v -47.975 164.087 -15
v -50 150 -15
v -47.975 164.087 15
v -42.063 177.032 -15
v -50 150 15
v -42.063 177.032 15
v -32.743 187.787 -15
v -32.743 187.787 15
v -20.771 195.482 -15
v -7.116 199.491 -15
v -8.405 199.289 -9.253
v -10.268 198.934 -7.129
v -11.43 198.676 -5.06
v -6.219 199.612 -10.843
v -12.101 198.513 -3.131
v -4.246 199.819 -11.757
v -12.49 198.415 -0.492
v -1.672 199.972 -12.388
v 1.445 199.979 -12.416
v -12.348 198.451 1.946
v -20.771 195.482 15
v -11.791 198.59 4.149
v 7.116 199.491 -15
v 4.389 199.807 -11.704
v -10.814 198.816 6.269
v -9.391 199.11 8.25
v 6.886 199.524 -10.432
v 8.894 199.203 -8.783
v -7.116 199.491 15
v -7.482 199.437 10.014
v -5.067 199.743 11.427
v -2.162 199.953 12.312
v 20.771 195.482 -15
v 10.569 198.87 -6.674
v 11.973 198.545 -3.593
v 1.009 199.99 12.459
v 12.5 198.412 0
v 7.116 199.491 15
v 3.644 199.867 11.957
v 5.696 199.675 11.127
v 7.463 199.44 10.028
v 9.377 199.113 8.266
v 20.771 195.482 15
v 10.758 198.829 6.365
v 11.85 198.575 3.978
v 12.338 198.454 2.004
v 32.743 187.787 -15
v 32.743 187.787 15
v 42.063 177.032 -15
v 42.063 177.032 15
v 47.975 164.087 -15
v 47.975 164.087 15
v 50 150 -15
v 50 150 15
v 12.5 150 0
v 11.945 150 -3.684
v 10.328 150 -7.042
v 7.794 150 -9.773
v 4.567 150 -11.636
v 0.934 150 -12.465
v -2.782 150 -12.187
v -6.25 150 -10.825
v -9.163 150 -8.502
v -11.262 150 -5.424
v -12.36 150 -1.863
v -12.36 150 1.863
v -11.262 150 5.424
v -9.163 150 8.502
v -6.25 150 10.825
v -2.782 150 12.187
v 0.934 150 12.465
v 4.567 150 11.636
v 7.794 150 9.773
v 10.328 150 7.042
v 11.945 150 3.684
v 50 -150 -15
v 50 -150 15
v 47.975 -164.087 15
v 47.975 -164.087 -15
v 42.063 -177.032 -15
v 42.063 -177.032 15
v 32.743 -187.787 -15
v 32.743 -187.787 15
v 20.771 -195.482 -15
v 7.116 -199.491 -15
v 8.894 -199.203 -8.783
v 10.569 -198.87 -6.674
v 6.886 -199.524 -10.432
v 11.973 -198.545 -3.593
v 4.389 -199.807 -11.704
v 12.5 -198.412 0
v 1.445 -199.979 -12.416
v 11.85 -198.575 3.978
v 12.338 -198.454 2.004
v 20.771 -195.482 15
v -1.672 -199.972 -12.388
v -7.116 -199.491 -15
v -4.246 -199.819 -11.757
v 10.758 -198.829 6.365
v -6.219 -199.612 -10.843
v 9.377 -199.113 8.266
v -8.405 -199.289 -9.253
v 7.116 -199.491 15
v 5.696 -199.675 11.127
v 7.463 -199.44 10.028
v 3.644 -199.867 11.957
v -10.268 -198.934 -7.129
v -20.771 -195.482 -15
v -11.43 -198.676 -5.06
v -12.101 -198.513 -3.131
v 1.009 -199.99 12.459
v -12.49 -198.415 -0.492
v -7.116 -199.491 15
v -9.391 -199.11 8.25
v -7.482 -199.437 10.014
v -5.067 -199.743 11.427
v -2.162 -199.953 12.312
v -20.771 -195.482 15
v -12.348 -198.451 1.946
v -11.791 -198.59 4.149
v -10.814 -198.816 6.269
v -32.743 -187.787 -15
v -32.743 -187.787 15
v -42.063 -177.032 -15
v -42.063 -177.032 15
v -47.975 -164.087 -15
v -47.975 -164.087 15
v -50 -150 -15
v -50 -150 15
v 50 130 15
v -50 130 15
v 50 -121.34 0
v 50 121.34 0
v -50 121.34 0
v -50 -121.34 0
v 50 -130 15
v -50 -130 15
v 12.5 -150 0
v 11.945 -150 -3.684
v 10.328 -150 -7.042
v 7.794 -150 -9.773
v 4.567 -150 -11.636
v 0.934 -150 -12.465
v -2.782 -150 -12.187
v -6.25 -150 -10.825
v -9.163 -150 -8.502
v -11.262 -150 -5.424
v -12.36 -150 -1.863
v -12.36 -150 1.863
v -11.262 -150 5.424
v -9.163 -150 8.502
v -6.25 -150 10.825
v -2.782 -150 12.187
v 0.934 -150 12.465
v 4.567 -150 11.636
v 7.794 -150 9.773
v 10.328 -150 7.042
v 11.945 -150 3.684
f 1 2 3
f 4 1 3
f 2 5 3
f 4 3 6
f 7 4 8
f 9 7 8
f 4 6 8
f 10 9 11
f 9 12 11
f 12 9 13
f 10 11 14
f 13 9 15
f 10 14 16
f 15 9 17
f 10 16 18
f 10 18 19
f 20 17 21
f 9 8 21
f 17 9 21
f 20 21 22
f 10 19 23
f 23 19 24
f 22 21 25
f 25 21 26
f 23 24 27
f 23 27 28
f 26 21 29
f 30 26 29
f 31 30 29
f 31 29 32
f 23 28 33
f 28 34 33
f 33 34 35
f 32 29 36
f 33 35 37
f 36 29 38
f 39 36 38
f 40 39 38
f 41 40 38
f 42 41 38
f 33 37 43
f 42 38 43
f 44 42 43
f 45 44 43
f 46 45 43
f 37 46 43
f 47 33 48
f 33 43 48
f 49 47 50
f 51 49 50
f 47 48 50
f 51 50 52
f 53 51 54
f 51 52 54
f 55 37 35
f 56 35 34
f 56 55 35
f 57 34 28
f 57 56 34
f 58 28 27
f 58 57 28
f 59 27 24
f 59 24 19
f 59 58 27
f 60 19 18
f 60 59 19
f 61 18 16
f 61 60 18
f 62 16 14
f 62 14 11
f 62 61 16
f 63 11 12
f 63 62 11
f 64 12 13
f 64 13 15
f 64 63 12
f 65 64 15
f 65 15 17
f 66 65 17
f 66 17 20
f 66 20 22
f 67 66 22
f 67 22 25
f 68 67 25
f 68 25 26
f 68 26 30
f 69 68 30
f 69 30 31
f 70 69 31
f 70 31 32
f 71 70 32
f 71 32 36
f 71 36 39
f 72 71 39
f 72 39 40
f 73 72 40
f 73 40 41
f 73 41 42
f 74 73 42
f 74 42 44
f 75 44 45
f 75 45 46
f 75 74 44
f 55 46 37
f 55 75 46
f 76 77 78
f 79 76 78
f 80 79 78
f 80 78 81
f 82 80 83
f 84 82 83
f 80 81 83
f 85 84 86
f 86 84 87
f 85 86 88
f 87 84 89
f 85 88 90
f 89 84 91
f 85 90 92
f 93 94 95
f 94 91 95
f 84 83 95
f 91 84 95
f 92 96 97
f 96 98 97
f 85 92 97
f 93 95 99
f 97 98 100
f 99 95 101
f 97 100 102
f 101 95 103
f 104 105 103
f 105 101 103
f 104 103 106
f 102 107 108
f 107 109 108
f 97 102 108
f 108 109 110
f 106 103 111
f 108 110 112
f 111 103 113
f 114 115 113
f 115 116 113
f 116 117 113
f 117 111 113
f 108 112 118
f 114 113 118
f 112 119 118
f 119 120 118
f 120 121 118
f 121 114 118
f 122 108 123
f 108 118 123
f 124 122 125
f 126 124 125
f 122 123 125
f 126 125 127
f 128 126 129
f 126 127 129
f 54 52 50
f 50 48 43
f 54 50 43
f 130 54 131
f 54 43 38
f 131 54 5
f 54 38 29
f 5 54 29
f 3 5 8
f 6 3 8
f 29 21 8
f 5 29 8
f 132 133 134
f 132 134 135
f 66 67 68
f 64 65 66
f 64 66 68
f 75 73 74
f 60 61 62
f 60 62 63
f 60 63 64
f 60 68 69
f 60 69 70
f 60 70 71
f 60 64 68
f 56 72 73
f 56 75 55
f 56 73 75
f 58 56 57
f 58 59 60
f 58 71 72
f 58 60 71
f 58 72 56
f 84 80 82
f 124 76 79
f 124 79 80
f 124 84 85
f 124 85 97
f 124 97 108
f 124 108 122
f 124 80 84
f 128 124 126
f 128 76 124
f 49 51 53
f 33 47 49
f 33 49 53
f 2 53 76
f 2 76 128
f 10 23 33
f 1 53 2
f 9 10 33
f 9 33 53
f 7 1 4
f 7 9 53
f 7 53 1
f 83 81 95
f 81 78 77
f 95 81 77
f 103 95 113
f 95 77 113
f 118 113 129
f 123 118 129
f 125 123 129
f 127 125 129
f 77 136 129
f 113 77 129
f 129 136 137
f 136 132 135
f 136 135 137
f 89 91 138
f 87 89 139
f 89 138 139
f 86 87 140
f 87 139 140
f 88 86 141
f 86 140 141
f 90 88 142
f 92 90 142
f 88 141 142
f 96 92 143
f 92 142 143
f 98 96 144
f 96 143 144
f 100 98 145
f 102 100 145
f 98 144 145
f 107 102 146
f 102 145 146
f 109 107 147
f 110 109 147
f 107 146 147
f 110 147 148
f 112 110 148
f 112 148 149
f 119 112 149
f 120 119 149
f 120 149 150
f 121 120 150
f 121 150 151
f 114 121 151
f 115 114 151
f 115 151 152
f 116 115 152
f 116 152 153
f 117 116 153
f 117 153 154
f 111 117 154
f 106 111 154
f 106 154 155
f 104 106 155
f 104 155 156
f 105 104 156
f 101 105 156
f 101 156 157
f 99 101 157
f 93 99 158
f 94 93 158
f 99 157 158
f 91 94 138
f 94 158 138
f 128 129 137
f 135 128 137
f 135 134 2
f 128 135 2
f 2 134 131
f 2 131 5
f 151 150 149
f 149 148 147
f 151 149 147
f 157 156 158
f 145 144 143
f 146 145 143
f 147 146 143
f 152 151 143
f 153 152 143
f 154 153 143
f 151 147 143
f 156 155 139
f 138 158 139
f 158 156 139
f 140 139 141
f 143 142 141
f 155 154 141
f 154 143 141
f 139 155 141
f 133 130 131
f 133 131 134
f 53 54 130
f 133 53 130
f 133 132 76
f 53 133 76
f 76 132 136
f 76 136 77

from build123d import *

# Parameters (mm, degrees)
BOSS_EXTRUDE1_DEPTH = 15
SKETCH5_R           = 12.5
CUT_EXTRUDE1_DEPTH  = 59
CUT_EXTRUDE3_DEPTH  = 110
SKETCH10_R          = 12.5
CUT_EXTRUDE4_DEPTH  = 94


with BuildPart() as part:
    # Sketch2 → Boss-Extrude1 (new body, symmetric)
    with BuildSketch(Plane.XY):
        with BuildLine():
            Line((-50, -150), (-50, 150))
            ThreePointArc((-50, 150), (0, 200), (50, 150))
            Line((50, 150), (50, -150))
            ThreePointArc((50, -150), (0, -200), (-50, -150))
        make_face()
    extrude(amount=BOSS_EXTRUDE1_DEPTH, both=True)

    # Sketch5 → Cut-Extrude1 (cut)
    with BuildSketch(Plane(origin=(0, 150, 0), x_dir=(1, 0, 0), z_dir=(0, 1, 0))):
        Circle(SKETCH5_R)
    extrude(amount=CUT_EXTRUDE1_DEPTH, mode=Mode.SUBTRACT)

    # Sketch7 → Cut-Extrude3 (cut)
    with BuildSketch(Plane(origin=(50, 0, 0), x_dir=(0, 0, -1), z_dir=(1, 0, 0))):
        Polygon((-15, 130), (0, 121.339745962), (0, -121.339745962), (-15, -130), align=None)
    extrude(amount=-CUT_EXTRUDE3_DEPTH, mode=Mode.SUBTRACT)

    # Sketch10 → Cut-Extrude4 (cut)
    with BuildSketch(Plane(origin=(0, -150, 0), x_dir=(1, 0, 0), z_dir=(0, 1, 0))):
        Circle(SKETCH10_R)
    extrude(amount=-CUT_EXTRUDE4_DEPTH, mode=Mode.SUBTRACT)


solid = part.part
